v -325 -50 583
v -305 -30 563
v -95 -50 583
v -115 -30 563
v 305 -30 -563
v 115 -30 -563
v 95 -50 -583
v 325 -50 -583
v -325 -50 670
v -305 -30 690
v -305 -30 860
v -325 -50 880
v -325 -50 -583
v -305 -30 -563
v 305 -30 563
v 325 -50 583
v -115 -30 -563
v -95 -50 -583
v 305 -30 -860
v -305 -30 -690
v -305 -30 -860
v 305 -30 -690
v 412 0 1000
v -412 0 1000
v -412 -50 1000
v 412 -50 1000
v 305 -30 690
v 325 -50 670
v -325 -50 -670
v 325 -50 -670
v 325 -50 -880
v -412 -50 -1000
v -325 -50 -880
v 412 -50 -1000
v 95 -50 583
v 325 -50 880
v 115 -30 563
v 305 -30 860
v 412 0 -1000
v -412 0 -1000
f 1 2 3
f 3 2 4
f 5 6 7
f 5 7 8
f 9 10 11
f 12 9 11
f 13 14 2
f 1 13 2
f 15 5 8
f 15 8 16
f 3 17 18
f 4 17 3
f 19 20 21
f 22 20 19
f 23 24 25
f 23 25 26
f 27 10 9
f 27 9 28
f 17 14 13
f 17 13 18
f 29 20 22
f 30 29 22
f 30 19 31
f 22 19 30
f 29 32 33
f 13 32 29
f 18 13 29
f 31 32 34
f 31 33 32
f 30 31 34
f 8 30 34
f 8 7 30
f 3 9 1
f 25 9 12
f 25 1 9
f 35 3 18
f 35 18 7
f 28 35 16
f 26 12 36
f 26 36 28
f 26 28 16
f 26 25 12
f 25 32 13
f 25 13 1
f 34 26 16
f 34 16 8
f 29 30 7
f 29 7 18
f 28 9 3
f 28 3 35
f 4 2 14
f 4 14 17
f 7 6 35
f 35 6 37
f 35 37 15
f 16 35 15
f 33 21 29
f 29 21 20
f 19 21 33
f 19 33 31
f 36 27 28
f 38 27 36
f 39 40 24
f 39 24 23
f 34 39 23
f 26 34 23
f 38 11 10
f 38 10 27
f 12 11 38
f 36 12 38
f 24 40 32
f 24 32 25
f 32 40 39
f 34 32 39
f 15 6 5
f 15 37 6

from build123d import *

# Parameters (mm, degrees)
F0_W     = 824
F0_H     = 2000
F1_DEPTH = 50
F2_W     = 650
F2_H     = 210
F2_W_2   = 230
F2_H_2   = 1166
F3_DEPTH = 20
F4_SIZE  = 19.99999


# Not quite as in the source:
# - a fillet or chamfer is up to 0.001 mm smaller than in the source, because OpenCascade refuses the exact size


with BuildPart() as f1:
    # F0 (on Front) → F1 (new body)
    with BuildSketch(Plane.XZ):
        Rectangle(F0_W, F0_H)
    extrude(amount=F1_DEPTH)

    # F2 (on face) → F3 (cut)
    with BuildSketch(Plane.XZ.offset(50)):
        with Locations((0, 775)):
            Rectangle(F2_W, F2_H)
        with Locations((-210, 0)):
            Rectangle(F2_W_2, F2_H_2)
        with Locations((210, 0)):
            Rectangle(F2_W_2, F2_H_2)
        with Locations((0, -775)):
            Rectangle(F2_W, F2_H)
    extrude(amount=-F3_DEPTH, mode=Mode.SUBTRACT)

    # F4 (size 20 in the source; OpenCascade refuses exactly that, so slightly less here)
    f4_edges = [f1.edges().sort_by_distance(p)[0] for p in [
        (-95, -30, 0),
        (-210, -30, 583),
        (-325, -30, 0),
        (-210, -30, -583),
        (210, -30, -583),
        (95, -30, 0),
        (325, -30, 0),
        (210, -30, 583),
        (0, -30, 880),
        (-325, -30, 775),
        (325, -30, 775),
        (0, -30, 670),
        (-325, -30, -775),
        (0, -30, -880),
        (325, -30, -775),
        (0, -30, -670),
    ]]
    chamfer(f4_edges, length=F4_SIZE)


solid = f1.part
